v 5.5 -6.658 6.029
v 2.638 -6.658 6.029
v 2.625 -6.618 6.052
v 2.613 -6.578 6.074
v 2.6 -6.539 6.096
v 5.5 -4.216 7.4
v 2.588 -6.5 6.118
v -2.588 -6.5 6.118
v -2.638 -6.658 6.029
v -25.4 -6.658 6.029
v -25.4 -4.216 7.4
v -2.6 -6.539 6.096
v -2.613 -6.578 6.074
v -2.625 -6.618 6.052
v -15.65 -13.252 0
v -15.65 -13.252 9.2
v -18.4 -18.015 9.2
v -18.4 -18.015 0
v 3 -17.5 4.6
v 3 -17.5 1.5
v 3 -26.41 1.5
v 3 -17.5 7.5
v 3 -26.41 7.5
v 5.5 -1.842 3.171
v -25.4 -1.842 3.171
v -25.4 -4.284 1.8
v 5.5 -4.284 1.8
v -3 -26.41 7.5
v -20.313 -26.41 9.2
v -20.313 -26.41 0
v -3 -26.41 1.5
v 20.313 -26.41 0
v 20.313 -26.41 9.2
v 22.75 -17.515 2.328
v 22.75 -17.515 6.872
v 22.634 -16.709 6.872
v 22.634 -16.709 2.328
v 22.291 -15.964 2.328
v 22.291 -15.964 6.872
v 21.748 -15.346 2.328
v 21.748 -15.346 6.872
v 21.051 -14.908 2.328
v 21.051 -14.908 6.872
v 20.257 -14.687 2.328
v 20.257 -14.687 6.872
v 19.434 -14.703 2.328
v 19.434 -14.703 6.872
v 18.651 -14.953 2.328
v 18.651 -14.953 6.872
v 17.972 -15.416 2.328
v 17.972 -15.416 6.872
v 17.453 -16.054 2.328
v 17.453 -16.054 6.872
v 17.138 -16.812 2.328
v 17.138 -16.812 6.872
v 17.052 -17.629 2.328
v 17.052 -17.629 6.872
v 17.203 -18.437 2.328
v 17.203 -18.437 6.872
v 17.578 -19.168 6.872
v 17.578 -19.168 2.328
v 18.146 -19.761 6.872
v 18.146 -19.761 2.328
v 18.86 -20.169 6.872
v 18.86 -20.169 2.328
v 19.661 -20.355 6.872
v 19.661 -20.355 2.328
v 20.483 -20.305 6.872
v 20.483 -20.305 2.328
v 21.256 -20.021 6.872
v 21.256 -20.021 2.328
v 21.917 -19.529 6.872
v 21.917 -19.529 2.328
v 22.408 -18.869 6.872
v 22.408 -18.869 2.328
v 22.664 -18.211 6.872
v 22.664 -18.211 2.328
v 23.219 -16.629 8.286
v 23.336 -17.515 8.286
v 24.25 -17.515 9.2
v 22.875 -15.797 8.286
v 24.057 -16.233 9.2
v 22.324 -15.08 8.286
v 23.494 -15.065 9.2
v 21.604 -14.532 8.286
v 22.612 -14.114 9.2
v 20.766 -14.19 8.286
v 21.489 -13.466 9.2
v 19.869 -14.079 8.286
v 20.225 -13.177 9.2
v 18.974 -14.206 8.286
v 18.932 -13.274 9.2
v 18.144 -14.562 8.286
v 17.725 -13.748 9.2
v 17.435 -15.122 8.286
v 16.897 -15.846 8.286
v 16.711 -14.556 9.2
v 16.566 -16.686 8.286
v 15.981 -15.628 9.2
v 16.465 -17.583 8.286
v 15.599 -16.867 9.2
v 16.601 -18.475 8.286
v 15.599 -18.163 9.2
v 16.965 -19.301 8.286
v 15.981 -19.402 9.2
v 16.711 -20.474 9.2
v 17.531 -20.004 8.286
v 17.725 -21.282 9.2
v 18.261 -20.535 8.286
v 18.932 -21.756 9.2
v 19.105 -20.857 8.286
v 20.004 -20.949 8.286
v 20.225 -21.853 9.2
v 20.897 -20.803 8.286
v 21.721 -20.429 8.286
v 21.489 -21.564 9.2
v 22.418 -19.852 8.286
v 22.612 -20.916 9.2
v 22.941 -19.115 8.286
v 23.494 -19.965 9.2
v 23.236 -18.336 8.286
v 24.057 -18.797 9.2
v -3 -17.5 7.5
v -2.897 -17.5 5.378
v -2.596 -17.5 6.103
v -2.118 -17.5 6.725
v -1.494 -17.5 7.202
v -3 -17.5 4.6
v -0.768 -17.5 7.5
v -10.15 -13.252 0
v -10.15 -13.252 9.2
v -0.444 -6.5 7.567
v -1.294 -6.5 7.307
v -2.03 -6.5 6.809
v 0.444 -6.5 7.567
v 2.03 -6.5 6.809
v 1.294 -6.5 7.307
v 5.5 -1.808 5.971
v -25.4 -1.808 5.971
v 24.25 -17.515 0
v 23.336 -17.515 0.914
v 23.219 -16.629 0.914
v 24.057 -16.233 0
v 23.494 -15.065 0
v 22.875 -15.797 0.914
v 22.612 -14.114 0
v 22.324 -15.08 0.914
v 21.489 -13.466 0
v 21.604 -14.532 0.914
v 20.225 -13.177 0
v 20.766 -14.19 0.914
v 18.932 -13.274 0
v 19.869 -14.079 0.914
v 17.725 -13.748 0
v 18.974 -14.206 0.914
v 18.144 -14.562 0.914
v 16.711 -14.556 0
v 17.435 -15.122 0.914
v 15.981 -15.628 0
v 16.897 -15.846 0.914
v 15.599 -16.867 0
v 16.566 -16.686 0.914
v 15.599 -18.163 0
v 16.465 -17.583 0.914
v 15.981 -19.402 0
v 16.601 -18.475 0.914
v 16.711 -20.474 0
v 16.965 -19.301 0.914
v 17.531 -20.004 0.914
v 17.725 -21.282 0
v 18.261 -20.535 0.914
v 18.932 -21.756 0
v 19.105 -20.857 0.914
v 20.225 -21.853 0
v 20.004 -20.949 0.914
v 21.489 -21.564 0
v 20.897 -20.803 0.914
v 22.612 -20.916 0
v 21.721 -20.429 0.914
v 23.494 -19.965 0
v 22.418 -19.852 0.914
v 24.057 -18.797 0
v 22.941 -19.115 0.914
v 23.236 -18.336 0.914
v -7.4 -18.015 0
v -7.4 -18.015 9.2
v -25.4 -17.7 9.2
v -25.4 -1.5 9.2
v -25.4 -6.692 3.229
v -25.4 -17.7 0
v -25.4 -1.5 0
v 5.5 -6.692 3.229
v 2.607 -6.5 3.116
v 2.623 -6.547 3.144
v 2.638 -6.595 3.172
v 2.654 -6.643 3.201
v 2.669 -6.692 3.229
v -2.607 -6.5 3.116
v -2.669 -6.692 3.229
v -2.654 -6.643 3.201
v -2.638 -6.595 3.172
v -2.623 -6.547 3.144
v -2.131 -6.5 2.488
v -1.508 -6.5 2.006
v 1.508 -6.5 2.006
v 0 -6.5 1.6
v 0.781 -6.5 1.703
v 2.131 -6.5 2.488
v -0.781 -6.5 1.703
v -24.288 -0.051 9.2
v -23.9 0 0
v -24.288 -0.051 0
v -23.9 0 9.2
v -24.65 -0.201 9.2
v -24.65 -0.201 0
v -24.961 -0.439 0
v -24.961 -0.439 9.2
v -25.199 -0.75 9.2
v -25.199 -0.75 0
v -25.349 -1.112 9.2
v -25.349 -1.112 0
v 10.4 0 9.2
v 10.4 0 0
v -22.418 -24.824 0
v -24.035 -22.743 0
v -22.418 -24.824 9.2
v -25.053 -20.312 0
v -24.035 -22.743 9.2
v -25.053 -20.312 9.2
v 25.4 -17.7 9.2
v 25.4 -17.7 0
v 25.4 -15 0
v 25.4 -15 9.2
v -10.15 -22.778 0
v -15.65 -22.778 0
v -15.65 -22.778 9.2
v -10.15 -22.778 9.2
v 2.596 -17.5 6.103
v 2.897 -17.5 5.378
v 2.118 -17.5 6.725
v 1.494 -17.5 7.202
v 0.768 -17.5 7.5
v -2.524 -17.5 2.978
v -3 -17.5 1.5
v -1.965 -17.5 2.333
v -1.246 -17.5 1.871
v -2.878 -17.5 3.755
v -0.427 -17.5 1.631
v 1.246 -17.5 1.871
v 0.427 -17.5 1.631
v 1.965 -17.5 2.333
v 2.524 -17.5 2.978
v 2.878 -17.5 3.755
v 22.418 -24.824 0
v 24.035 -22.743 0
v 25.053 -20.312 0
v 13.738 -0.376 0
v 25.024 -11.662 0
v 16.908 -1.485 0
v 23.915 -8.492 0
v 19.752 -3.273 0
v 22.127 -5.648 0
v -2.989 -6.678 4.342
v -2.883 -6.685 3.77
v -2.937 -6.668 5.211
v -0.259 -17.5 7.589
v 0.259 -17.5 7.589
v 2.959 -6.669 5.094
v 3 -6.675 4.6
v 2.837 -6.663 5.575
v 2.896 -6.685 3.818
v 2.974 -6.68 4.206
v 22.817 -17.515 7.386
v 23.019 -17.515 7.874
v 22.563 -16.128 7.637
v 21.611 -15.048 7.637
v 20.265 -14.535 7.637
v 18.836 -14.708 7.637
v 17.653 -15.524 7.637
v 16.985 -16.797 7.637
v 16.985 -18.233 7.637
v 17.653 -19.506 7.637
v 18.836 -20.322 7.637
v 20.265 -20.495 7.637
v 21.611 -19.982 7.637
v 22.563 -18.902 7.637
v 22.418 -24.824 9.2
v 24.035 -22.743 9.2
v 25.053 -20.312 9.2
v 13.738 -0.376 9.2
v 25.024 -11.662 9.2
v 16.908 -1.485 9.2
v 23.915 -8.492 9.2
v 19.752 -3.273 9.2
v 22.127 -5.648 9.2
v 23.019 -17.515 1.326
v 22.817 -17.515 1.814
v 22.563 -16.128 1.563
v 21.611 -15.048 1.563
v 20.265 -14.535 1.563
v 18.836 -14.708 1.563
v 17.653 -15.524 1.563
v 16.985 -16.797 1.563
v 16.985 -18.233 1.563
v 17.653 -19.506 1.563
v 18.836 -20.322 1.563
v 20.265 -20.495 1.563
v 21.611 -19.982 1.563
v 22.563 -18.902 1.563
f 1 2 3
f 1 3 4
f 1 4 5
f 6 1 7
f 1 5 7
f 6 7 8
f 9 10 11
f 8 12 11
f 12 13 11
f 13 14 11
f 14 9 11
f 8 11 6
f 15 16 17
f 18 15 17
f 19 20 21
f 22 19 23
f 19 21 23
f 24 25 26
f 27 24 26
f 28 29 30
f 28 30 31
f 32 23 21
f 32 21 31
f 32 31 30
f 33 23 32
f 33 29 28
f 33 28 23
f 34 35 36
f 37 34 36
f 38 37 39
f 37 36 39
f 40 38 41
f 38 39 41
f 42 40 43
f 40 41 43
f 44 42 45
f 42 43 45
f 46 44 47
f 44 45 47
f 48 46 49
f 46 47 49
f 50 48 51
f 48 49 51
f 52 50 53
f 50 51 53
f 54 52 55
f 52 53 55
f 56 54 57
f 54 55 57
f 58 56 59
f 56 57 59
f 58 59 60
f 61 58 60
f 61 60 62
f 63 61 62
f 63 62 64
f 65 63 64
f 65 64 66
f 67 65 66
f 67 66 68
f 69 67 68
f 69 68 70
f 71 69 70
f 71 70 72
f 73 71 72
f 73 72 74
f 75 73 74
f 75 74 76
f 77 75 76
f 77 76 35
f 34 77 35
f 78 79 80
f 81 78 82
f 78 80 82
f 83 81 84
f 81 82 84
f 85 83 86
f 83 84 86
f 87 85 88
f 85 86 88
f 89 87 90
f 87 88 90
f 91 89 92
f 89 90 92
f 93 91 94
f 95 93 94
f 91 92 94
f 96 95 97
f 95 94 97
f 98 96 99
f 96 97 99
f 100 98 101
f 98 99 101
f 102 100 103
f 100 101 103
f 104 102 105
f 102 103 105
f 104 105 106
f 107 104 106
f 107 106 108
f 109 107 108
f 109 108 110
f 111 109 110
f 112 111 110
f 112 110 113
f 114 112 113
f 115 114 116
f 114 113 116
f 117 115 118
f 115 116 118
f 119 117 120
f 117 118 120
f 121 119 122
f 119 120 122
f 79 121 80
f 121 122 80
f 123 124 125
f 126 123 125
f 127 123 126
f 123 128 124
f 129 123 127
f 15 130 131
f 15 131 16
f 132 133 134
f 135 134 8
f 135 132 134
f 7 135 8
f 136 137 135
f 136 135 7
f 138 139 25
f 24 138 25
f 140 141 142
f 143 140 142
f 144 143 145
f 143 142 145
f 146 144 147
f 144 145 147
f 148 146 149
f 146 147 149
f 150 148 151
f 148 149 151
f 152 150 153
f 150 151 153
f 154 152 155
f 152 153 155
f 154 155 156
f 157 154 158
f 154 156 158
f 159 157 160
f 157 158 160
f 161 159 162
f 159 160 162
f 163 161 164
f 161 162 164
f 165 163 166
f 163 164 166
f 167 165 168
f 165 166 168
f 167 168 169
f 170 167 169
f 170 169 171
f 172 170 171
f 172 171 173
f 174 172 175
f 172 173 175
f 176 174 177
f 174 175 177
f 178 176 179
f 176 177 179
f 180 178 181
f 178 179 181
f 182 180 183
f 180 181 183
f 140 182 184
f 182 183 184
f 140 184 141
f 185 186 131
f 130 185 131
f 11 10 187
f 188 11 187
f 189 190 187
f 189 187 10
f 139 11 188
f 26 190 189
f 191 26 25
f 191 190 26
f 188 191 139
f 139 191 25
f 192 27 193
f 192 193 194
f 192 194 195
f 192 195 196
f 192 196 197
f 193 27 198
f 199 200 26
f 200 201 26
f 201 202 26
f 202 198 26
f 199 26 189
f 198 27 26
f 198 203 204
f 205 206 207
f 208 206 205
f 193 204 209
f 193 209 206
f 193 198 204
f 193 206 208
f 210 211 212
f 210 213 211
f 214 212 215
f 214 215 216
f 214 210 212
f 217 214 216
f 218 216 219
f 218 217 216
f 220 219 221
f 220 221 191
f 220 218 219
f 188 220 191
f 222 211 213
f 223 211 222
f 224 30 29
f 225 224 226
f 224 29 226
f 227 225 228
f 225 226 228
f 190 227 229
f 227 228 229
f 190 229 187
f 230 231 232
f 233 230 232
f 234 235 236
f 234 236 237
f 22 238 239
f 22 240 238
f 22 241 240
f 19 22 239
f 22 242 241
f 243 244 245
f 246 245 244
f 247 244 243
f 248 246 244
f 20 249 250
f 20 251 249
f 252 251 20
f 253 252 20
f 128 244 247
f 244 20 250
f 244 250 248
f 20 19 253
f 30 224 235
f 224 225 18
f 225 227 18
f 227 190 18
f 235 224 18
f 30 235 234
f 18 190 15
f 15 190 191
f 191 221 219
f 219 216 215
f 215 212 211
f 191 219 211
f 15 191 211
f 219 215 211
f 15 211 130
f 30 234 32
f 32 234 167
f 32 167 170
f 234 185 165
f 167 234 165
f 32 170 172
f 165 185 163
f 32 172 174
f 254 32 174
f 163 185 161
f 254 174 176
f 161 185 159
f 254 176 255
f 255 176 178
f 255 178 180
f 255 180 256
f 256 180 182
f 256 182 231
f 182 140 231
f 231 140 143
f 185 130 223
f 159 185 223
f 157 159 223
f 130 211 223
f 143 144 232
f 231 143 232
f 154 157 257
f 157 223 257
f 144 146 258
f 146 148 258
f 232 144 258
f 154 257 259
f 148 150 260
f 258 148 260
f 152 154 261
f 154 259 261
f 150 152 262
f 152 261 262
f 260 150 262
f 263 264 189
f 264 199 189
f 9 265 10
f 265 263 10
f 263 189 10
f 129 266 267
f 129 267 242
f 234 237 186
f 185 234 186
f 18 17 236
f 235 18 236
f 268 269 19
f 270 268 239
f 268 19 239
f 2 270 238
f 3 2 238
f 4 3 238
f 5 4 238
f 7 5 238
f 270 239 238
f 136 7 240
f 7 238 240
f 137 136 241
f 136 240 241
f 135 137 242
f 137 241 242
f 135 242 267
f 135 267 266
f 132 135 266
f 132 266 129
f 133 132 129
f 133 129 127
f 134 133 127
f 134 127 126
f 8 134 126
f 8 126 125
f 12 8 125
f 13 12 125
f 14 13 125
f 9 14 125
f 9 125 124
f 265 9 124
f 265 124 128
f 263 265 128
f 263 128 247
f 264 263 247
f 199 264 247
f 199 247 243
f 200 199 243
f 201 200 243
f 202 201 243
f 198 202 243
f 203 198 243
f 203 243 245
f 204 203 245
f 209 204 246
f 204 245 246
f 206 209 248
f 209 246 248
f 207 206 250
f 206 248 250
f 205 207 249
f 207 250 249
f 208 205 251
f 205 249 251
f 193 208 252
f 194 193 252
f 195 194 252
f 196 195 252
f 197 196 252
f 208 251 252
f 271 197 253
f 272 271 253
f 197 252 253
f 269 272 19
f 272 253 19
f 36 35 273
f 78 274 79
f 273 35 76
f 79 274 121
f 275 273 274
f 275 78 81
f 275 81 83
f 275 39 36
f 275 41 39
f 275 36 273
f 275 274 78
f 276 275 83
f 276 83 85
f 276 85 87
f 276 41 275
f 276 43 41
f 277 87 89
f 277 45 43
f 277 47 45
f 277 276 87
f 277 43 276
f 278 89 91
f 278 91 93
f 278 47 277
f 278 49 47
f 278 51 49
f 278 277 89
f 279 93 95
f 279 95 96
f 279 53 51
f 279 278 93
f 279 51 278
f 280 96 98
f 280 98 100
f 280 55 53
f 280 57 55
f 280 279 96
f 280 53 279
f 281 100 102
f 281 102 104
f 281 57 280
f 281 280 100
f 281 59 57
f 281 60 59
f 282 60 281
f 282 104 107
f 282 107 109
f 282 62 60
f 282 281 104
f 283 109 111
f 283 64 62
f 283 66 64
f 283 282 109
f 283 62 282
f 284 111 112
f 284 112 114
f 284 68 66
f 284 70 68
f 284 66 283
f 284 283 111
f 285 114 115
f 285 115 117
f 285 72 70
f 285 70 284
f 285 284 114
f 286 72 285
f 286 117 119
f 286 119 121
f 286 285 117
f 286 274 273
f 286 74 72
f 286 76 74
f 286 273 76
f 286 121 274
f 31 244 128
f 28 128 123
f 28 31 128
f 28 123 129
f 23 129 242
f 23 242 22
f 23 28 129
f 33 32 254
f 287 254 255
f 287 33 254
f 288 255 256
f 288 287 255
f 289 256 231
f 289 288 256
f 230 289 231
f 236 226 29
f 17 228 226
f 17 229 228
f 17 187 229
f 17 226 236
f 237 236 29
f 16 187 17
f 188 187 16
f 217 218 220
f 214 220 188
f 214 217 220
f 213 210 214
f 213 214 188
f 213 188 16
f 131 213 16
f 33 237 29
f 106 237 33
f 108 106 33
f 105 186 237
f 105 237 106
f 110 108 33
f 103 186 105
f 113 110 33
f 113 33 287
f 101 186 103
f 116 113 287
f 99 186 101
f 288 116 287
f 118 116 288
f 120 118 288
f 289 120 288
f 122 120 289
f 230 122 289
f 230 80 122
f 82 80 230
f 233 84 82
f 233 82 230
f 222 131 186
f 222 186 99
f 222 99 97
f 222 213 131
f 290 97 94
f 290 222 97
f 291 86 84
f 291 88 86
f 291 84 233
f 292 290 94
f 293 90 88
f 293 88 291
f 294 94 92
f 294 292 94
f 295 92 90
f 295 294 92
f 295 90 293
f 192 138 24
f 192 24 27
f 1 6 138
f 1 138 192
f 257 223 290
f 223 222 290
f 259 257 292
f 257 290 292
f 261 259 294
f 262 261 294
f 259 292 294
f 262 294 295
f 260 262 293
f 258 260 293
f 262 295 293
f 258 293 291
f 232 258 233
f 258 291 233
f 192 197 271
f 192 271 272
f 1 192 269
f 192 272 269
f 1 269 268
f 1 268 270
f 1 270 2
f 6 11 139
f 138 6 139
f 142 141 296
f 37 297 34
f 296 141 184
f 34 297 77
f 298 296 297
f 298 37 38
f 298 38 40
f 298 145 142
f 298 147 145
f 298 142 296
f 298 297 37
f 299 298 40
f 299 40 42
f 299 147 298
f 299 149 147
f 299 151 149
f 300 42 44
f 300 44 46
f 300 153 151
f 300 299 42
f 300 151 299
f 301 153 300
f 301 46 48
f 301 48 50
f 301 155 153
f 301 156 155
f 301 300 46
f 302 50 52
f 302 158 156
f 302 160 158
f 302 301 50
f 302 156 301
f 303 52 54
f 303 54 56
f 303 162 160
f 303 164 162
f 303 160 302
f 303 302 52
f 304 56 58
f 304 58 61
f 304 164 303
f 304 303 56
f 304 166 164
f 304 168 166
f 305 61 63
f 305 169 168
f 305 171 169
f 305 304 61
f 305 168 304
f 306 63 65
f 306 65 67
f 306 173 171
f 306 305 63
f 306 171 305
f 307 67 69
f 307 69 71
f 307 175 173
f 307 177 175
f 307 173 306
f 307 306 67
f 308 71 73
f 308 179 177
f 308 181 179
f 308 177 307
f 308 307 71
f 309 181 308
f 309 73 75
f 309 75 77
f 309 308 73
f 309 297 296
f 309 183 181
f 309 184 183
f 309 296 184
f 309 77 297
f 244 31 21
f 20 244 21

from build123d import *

# Parameters (mm, degrees)
SKETCH090_W     = 50.8
SKETCH090_H     = 27.7
PAD023_DEPTH    = 9.2
SKETCH091_W     = 6
SKETCH091_H     = 6
POCKET075_DEPTH = 10.2
SKETCH092_R     = 3
POCKET076_DEPTH = 11
POCKET077_DEPTH = 30.9
SKETCH094_R     = 2.85
POCKET078_DEPTH = 9.201
POCKET079_DEPTH = 9.201
SKETCH096_W     = 6.5
SKETCH096_H     = 6.5
PAD024_DEPTH    = 1.75
SKETCH097_W     = 5.2
SKETCH097_H     = 5.2
POCKET080_DEPTH = 1.75
FILLET004_R     = 10
FILLET005_R     = 15
FILLET006_R     = 1.5
SKETCH098_W     = 54.781057
SKETCH098_H     = 5.471817
POCKET081_DEPTH = 9.201
CHAMFER014_SIZE = 1.5
FILLET007_R     = 2


with BuildPart() as part:
    # Sketch090 → Pad023 (new body)
    with BuildSketch(Plane.XY):
        with Locations((0, -13.85)):
            Rectangle(SKETCH090_W, SKETCH090_H)
    extrude(amount=PAD023_DEPTH)

    # Sketch091 (on Face2 of Pad023) → Pocket075 (cut)
    with BuildSketch(Plane.XZ.offset(27.7)):
        with Locations((0, 4.5)):
            Rectangle(SKETCH091_W, SKETCH091_H)
    extrude(amount=-POCKET075_DEPTH, mode=Mode.SUBTRACT)

    # Sketch092 (on Face11 of Pocket075) → Pocket076 (cut)
    with BuildSketch(Plane.XZ.offset(17.5)):
        with Locations((0, 4.6)):
            Circle(SKETCH092_R)
    extrude(amount=-POCKET076_DEPTH, mode=Mode.SUBTRACT)

    # Sketch093 (on Face1 of Pocket076) → Pocket077 (cut)
    with BuildSketch(Plane(origin=(-25.4, 0, 0), x_dir=(0, -1, 0), z_dir=(-1, 0, 0))):
        Polygon((6.65774, 6.029261), (4.216094, 7.399795), (1.808354, 5.970534), (1.84226, 3.170739), (4.283906, 1.800205), (6.691646, 3.229466), align=None)
    extrude(amount=-POCKET077_DEPTH, mode=Mode.SUBTRACT)

    # Sketch094 (on Face4 of Pocket077) → Pocket078 (cut, through all)
    with BuildSketch(Plane.XY.offset(9.2)):
        with Locations((19.9, -17.515)):
            Circle(SKETCH094_R)
    extrude(amount=-POCKET078_DEPTH, mode=Mode.SUBTRACT)

    # Sketch095 (on Face4 of Pocket078) → Pocket079 (cut, through all)
    with BuildSketch(Plane.XY.offset(9.2)):
        Polygon((-7.4, -18.015), (-10.15, -13.25186), (-15.65, -13.25186), (-18.4, -18.015), (-15.65, -22.77814), (-10.15, -22.77814), align=None)
    extrude(amount=-POCKET079_DEPTH, mode=Mode.SUBTRACT)

    # Sketch096 (on Face5 of Pocket079) → Pad024 (join)
    with BuildSketch(Plane.XZ.offset(27.7)):
        with Locations((0, 4.6)):
            Rectangle(SKETCH096_W, SKETCH096_H)
    extrude(amount=PAD024_DEPTH)

    # Sketch097 (on Face29 of Pad024) → Pocket080 (cut)
    with BuildSketch(Plane.XZ.offset(29.45)):
        with Locations((0, 4.6)):
            Rectangle(SKETCH097_W, SKETCH097_H)
    extrude(amount=-POCKET080_DEPTH, mode=Mode.SUBTRACT)

    # Fillet004
    fillet004_edges = [part.edges().sort_by_distance(p)[0] for p in [
        (-25.4, -27.7, 4.6),
        (25.4, -27.7, 4.6),
    ]]
    fillet(fillet004_edges, radius=FILLET004_R)

    # Fillet005
    fillet005_edges = [part.edges().sort_by_distance(p)[0] for p in [
        (25.4, 0, 4.6),
    ]]
    fillet(fillet005_edges, radius=FILLET005_R)

    # Fillet006
    fillet006_edges = [part.edges().sort_by_distance(p)[0] for p in [
        (-25.4, 0, 4.6),
    ]]
    fillet(fillet006_edges, radius=FILLET006_R)

    # Sketch098 (on Face17 of Fillet006) → Pocket081 (cut, through all)
    with BuildSketch(Plane.XY.offset(9.2)):
        with Locations((-1.693186, -29.145549)):
            Rectangle(SKETCH098_W, SKETCH098_H)
    extrude(amount=-POCKET081_DEPTH, mode=Mode.SUBTRACT)

    # Chamfer014
    chamfer014_edges = [part.edges().sort_by_distance(p)[0] for p in [
        (17.05, -17.515, 9.2),
        (17.05, -17.515, 0),
    ]]
    chamfer(chamfer014_edges, length=CHAMFER014_SIZE)

    # Fillet007
    fillet007_edges = [part.edges().sort_by_distance(p)[0] for p in [
        (17.05, -17.515, 7.7),
        (17.05, -17.515, 1.5),
    ]]
    fillet(fillet007_edges, radius=FILLET007_R)


solid = part.part
